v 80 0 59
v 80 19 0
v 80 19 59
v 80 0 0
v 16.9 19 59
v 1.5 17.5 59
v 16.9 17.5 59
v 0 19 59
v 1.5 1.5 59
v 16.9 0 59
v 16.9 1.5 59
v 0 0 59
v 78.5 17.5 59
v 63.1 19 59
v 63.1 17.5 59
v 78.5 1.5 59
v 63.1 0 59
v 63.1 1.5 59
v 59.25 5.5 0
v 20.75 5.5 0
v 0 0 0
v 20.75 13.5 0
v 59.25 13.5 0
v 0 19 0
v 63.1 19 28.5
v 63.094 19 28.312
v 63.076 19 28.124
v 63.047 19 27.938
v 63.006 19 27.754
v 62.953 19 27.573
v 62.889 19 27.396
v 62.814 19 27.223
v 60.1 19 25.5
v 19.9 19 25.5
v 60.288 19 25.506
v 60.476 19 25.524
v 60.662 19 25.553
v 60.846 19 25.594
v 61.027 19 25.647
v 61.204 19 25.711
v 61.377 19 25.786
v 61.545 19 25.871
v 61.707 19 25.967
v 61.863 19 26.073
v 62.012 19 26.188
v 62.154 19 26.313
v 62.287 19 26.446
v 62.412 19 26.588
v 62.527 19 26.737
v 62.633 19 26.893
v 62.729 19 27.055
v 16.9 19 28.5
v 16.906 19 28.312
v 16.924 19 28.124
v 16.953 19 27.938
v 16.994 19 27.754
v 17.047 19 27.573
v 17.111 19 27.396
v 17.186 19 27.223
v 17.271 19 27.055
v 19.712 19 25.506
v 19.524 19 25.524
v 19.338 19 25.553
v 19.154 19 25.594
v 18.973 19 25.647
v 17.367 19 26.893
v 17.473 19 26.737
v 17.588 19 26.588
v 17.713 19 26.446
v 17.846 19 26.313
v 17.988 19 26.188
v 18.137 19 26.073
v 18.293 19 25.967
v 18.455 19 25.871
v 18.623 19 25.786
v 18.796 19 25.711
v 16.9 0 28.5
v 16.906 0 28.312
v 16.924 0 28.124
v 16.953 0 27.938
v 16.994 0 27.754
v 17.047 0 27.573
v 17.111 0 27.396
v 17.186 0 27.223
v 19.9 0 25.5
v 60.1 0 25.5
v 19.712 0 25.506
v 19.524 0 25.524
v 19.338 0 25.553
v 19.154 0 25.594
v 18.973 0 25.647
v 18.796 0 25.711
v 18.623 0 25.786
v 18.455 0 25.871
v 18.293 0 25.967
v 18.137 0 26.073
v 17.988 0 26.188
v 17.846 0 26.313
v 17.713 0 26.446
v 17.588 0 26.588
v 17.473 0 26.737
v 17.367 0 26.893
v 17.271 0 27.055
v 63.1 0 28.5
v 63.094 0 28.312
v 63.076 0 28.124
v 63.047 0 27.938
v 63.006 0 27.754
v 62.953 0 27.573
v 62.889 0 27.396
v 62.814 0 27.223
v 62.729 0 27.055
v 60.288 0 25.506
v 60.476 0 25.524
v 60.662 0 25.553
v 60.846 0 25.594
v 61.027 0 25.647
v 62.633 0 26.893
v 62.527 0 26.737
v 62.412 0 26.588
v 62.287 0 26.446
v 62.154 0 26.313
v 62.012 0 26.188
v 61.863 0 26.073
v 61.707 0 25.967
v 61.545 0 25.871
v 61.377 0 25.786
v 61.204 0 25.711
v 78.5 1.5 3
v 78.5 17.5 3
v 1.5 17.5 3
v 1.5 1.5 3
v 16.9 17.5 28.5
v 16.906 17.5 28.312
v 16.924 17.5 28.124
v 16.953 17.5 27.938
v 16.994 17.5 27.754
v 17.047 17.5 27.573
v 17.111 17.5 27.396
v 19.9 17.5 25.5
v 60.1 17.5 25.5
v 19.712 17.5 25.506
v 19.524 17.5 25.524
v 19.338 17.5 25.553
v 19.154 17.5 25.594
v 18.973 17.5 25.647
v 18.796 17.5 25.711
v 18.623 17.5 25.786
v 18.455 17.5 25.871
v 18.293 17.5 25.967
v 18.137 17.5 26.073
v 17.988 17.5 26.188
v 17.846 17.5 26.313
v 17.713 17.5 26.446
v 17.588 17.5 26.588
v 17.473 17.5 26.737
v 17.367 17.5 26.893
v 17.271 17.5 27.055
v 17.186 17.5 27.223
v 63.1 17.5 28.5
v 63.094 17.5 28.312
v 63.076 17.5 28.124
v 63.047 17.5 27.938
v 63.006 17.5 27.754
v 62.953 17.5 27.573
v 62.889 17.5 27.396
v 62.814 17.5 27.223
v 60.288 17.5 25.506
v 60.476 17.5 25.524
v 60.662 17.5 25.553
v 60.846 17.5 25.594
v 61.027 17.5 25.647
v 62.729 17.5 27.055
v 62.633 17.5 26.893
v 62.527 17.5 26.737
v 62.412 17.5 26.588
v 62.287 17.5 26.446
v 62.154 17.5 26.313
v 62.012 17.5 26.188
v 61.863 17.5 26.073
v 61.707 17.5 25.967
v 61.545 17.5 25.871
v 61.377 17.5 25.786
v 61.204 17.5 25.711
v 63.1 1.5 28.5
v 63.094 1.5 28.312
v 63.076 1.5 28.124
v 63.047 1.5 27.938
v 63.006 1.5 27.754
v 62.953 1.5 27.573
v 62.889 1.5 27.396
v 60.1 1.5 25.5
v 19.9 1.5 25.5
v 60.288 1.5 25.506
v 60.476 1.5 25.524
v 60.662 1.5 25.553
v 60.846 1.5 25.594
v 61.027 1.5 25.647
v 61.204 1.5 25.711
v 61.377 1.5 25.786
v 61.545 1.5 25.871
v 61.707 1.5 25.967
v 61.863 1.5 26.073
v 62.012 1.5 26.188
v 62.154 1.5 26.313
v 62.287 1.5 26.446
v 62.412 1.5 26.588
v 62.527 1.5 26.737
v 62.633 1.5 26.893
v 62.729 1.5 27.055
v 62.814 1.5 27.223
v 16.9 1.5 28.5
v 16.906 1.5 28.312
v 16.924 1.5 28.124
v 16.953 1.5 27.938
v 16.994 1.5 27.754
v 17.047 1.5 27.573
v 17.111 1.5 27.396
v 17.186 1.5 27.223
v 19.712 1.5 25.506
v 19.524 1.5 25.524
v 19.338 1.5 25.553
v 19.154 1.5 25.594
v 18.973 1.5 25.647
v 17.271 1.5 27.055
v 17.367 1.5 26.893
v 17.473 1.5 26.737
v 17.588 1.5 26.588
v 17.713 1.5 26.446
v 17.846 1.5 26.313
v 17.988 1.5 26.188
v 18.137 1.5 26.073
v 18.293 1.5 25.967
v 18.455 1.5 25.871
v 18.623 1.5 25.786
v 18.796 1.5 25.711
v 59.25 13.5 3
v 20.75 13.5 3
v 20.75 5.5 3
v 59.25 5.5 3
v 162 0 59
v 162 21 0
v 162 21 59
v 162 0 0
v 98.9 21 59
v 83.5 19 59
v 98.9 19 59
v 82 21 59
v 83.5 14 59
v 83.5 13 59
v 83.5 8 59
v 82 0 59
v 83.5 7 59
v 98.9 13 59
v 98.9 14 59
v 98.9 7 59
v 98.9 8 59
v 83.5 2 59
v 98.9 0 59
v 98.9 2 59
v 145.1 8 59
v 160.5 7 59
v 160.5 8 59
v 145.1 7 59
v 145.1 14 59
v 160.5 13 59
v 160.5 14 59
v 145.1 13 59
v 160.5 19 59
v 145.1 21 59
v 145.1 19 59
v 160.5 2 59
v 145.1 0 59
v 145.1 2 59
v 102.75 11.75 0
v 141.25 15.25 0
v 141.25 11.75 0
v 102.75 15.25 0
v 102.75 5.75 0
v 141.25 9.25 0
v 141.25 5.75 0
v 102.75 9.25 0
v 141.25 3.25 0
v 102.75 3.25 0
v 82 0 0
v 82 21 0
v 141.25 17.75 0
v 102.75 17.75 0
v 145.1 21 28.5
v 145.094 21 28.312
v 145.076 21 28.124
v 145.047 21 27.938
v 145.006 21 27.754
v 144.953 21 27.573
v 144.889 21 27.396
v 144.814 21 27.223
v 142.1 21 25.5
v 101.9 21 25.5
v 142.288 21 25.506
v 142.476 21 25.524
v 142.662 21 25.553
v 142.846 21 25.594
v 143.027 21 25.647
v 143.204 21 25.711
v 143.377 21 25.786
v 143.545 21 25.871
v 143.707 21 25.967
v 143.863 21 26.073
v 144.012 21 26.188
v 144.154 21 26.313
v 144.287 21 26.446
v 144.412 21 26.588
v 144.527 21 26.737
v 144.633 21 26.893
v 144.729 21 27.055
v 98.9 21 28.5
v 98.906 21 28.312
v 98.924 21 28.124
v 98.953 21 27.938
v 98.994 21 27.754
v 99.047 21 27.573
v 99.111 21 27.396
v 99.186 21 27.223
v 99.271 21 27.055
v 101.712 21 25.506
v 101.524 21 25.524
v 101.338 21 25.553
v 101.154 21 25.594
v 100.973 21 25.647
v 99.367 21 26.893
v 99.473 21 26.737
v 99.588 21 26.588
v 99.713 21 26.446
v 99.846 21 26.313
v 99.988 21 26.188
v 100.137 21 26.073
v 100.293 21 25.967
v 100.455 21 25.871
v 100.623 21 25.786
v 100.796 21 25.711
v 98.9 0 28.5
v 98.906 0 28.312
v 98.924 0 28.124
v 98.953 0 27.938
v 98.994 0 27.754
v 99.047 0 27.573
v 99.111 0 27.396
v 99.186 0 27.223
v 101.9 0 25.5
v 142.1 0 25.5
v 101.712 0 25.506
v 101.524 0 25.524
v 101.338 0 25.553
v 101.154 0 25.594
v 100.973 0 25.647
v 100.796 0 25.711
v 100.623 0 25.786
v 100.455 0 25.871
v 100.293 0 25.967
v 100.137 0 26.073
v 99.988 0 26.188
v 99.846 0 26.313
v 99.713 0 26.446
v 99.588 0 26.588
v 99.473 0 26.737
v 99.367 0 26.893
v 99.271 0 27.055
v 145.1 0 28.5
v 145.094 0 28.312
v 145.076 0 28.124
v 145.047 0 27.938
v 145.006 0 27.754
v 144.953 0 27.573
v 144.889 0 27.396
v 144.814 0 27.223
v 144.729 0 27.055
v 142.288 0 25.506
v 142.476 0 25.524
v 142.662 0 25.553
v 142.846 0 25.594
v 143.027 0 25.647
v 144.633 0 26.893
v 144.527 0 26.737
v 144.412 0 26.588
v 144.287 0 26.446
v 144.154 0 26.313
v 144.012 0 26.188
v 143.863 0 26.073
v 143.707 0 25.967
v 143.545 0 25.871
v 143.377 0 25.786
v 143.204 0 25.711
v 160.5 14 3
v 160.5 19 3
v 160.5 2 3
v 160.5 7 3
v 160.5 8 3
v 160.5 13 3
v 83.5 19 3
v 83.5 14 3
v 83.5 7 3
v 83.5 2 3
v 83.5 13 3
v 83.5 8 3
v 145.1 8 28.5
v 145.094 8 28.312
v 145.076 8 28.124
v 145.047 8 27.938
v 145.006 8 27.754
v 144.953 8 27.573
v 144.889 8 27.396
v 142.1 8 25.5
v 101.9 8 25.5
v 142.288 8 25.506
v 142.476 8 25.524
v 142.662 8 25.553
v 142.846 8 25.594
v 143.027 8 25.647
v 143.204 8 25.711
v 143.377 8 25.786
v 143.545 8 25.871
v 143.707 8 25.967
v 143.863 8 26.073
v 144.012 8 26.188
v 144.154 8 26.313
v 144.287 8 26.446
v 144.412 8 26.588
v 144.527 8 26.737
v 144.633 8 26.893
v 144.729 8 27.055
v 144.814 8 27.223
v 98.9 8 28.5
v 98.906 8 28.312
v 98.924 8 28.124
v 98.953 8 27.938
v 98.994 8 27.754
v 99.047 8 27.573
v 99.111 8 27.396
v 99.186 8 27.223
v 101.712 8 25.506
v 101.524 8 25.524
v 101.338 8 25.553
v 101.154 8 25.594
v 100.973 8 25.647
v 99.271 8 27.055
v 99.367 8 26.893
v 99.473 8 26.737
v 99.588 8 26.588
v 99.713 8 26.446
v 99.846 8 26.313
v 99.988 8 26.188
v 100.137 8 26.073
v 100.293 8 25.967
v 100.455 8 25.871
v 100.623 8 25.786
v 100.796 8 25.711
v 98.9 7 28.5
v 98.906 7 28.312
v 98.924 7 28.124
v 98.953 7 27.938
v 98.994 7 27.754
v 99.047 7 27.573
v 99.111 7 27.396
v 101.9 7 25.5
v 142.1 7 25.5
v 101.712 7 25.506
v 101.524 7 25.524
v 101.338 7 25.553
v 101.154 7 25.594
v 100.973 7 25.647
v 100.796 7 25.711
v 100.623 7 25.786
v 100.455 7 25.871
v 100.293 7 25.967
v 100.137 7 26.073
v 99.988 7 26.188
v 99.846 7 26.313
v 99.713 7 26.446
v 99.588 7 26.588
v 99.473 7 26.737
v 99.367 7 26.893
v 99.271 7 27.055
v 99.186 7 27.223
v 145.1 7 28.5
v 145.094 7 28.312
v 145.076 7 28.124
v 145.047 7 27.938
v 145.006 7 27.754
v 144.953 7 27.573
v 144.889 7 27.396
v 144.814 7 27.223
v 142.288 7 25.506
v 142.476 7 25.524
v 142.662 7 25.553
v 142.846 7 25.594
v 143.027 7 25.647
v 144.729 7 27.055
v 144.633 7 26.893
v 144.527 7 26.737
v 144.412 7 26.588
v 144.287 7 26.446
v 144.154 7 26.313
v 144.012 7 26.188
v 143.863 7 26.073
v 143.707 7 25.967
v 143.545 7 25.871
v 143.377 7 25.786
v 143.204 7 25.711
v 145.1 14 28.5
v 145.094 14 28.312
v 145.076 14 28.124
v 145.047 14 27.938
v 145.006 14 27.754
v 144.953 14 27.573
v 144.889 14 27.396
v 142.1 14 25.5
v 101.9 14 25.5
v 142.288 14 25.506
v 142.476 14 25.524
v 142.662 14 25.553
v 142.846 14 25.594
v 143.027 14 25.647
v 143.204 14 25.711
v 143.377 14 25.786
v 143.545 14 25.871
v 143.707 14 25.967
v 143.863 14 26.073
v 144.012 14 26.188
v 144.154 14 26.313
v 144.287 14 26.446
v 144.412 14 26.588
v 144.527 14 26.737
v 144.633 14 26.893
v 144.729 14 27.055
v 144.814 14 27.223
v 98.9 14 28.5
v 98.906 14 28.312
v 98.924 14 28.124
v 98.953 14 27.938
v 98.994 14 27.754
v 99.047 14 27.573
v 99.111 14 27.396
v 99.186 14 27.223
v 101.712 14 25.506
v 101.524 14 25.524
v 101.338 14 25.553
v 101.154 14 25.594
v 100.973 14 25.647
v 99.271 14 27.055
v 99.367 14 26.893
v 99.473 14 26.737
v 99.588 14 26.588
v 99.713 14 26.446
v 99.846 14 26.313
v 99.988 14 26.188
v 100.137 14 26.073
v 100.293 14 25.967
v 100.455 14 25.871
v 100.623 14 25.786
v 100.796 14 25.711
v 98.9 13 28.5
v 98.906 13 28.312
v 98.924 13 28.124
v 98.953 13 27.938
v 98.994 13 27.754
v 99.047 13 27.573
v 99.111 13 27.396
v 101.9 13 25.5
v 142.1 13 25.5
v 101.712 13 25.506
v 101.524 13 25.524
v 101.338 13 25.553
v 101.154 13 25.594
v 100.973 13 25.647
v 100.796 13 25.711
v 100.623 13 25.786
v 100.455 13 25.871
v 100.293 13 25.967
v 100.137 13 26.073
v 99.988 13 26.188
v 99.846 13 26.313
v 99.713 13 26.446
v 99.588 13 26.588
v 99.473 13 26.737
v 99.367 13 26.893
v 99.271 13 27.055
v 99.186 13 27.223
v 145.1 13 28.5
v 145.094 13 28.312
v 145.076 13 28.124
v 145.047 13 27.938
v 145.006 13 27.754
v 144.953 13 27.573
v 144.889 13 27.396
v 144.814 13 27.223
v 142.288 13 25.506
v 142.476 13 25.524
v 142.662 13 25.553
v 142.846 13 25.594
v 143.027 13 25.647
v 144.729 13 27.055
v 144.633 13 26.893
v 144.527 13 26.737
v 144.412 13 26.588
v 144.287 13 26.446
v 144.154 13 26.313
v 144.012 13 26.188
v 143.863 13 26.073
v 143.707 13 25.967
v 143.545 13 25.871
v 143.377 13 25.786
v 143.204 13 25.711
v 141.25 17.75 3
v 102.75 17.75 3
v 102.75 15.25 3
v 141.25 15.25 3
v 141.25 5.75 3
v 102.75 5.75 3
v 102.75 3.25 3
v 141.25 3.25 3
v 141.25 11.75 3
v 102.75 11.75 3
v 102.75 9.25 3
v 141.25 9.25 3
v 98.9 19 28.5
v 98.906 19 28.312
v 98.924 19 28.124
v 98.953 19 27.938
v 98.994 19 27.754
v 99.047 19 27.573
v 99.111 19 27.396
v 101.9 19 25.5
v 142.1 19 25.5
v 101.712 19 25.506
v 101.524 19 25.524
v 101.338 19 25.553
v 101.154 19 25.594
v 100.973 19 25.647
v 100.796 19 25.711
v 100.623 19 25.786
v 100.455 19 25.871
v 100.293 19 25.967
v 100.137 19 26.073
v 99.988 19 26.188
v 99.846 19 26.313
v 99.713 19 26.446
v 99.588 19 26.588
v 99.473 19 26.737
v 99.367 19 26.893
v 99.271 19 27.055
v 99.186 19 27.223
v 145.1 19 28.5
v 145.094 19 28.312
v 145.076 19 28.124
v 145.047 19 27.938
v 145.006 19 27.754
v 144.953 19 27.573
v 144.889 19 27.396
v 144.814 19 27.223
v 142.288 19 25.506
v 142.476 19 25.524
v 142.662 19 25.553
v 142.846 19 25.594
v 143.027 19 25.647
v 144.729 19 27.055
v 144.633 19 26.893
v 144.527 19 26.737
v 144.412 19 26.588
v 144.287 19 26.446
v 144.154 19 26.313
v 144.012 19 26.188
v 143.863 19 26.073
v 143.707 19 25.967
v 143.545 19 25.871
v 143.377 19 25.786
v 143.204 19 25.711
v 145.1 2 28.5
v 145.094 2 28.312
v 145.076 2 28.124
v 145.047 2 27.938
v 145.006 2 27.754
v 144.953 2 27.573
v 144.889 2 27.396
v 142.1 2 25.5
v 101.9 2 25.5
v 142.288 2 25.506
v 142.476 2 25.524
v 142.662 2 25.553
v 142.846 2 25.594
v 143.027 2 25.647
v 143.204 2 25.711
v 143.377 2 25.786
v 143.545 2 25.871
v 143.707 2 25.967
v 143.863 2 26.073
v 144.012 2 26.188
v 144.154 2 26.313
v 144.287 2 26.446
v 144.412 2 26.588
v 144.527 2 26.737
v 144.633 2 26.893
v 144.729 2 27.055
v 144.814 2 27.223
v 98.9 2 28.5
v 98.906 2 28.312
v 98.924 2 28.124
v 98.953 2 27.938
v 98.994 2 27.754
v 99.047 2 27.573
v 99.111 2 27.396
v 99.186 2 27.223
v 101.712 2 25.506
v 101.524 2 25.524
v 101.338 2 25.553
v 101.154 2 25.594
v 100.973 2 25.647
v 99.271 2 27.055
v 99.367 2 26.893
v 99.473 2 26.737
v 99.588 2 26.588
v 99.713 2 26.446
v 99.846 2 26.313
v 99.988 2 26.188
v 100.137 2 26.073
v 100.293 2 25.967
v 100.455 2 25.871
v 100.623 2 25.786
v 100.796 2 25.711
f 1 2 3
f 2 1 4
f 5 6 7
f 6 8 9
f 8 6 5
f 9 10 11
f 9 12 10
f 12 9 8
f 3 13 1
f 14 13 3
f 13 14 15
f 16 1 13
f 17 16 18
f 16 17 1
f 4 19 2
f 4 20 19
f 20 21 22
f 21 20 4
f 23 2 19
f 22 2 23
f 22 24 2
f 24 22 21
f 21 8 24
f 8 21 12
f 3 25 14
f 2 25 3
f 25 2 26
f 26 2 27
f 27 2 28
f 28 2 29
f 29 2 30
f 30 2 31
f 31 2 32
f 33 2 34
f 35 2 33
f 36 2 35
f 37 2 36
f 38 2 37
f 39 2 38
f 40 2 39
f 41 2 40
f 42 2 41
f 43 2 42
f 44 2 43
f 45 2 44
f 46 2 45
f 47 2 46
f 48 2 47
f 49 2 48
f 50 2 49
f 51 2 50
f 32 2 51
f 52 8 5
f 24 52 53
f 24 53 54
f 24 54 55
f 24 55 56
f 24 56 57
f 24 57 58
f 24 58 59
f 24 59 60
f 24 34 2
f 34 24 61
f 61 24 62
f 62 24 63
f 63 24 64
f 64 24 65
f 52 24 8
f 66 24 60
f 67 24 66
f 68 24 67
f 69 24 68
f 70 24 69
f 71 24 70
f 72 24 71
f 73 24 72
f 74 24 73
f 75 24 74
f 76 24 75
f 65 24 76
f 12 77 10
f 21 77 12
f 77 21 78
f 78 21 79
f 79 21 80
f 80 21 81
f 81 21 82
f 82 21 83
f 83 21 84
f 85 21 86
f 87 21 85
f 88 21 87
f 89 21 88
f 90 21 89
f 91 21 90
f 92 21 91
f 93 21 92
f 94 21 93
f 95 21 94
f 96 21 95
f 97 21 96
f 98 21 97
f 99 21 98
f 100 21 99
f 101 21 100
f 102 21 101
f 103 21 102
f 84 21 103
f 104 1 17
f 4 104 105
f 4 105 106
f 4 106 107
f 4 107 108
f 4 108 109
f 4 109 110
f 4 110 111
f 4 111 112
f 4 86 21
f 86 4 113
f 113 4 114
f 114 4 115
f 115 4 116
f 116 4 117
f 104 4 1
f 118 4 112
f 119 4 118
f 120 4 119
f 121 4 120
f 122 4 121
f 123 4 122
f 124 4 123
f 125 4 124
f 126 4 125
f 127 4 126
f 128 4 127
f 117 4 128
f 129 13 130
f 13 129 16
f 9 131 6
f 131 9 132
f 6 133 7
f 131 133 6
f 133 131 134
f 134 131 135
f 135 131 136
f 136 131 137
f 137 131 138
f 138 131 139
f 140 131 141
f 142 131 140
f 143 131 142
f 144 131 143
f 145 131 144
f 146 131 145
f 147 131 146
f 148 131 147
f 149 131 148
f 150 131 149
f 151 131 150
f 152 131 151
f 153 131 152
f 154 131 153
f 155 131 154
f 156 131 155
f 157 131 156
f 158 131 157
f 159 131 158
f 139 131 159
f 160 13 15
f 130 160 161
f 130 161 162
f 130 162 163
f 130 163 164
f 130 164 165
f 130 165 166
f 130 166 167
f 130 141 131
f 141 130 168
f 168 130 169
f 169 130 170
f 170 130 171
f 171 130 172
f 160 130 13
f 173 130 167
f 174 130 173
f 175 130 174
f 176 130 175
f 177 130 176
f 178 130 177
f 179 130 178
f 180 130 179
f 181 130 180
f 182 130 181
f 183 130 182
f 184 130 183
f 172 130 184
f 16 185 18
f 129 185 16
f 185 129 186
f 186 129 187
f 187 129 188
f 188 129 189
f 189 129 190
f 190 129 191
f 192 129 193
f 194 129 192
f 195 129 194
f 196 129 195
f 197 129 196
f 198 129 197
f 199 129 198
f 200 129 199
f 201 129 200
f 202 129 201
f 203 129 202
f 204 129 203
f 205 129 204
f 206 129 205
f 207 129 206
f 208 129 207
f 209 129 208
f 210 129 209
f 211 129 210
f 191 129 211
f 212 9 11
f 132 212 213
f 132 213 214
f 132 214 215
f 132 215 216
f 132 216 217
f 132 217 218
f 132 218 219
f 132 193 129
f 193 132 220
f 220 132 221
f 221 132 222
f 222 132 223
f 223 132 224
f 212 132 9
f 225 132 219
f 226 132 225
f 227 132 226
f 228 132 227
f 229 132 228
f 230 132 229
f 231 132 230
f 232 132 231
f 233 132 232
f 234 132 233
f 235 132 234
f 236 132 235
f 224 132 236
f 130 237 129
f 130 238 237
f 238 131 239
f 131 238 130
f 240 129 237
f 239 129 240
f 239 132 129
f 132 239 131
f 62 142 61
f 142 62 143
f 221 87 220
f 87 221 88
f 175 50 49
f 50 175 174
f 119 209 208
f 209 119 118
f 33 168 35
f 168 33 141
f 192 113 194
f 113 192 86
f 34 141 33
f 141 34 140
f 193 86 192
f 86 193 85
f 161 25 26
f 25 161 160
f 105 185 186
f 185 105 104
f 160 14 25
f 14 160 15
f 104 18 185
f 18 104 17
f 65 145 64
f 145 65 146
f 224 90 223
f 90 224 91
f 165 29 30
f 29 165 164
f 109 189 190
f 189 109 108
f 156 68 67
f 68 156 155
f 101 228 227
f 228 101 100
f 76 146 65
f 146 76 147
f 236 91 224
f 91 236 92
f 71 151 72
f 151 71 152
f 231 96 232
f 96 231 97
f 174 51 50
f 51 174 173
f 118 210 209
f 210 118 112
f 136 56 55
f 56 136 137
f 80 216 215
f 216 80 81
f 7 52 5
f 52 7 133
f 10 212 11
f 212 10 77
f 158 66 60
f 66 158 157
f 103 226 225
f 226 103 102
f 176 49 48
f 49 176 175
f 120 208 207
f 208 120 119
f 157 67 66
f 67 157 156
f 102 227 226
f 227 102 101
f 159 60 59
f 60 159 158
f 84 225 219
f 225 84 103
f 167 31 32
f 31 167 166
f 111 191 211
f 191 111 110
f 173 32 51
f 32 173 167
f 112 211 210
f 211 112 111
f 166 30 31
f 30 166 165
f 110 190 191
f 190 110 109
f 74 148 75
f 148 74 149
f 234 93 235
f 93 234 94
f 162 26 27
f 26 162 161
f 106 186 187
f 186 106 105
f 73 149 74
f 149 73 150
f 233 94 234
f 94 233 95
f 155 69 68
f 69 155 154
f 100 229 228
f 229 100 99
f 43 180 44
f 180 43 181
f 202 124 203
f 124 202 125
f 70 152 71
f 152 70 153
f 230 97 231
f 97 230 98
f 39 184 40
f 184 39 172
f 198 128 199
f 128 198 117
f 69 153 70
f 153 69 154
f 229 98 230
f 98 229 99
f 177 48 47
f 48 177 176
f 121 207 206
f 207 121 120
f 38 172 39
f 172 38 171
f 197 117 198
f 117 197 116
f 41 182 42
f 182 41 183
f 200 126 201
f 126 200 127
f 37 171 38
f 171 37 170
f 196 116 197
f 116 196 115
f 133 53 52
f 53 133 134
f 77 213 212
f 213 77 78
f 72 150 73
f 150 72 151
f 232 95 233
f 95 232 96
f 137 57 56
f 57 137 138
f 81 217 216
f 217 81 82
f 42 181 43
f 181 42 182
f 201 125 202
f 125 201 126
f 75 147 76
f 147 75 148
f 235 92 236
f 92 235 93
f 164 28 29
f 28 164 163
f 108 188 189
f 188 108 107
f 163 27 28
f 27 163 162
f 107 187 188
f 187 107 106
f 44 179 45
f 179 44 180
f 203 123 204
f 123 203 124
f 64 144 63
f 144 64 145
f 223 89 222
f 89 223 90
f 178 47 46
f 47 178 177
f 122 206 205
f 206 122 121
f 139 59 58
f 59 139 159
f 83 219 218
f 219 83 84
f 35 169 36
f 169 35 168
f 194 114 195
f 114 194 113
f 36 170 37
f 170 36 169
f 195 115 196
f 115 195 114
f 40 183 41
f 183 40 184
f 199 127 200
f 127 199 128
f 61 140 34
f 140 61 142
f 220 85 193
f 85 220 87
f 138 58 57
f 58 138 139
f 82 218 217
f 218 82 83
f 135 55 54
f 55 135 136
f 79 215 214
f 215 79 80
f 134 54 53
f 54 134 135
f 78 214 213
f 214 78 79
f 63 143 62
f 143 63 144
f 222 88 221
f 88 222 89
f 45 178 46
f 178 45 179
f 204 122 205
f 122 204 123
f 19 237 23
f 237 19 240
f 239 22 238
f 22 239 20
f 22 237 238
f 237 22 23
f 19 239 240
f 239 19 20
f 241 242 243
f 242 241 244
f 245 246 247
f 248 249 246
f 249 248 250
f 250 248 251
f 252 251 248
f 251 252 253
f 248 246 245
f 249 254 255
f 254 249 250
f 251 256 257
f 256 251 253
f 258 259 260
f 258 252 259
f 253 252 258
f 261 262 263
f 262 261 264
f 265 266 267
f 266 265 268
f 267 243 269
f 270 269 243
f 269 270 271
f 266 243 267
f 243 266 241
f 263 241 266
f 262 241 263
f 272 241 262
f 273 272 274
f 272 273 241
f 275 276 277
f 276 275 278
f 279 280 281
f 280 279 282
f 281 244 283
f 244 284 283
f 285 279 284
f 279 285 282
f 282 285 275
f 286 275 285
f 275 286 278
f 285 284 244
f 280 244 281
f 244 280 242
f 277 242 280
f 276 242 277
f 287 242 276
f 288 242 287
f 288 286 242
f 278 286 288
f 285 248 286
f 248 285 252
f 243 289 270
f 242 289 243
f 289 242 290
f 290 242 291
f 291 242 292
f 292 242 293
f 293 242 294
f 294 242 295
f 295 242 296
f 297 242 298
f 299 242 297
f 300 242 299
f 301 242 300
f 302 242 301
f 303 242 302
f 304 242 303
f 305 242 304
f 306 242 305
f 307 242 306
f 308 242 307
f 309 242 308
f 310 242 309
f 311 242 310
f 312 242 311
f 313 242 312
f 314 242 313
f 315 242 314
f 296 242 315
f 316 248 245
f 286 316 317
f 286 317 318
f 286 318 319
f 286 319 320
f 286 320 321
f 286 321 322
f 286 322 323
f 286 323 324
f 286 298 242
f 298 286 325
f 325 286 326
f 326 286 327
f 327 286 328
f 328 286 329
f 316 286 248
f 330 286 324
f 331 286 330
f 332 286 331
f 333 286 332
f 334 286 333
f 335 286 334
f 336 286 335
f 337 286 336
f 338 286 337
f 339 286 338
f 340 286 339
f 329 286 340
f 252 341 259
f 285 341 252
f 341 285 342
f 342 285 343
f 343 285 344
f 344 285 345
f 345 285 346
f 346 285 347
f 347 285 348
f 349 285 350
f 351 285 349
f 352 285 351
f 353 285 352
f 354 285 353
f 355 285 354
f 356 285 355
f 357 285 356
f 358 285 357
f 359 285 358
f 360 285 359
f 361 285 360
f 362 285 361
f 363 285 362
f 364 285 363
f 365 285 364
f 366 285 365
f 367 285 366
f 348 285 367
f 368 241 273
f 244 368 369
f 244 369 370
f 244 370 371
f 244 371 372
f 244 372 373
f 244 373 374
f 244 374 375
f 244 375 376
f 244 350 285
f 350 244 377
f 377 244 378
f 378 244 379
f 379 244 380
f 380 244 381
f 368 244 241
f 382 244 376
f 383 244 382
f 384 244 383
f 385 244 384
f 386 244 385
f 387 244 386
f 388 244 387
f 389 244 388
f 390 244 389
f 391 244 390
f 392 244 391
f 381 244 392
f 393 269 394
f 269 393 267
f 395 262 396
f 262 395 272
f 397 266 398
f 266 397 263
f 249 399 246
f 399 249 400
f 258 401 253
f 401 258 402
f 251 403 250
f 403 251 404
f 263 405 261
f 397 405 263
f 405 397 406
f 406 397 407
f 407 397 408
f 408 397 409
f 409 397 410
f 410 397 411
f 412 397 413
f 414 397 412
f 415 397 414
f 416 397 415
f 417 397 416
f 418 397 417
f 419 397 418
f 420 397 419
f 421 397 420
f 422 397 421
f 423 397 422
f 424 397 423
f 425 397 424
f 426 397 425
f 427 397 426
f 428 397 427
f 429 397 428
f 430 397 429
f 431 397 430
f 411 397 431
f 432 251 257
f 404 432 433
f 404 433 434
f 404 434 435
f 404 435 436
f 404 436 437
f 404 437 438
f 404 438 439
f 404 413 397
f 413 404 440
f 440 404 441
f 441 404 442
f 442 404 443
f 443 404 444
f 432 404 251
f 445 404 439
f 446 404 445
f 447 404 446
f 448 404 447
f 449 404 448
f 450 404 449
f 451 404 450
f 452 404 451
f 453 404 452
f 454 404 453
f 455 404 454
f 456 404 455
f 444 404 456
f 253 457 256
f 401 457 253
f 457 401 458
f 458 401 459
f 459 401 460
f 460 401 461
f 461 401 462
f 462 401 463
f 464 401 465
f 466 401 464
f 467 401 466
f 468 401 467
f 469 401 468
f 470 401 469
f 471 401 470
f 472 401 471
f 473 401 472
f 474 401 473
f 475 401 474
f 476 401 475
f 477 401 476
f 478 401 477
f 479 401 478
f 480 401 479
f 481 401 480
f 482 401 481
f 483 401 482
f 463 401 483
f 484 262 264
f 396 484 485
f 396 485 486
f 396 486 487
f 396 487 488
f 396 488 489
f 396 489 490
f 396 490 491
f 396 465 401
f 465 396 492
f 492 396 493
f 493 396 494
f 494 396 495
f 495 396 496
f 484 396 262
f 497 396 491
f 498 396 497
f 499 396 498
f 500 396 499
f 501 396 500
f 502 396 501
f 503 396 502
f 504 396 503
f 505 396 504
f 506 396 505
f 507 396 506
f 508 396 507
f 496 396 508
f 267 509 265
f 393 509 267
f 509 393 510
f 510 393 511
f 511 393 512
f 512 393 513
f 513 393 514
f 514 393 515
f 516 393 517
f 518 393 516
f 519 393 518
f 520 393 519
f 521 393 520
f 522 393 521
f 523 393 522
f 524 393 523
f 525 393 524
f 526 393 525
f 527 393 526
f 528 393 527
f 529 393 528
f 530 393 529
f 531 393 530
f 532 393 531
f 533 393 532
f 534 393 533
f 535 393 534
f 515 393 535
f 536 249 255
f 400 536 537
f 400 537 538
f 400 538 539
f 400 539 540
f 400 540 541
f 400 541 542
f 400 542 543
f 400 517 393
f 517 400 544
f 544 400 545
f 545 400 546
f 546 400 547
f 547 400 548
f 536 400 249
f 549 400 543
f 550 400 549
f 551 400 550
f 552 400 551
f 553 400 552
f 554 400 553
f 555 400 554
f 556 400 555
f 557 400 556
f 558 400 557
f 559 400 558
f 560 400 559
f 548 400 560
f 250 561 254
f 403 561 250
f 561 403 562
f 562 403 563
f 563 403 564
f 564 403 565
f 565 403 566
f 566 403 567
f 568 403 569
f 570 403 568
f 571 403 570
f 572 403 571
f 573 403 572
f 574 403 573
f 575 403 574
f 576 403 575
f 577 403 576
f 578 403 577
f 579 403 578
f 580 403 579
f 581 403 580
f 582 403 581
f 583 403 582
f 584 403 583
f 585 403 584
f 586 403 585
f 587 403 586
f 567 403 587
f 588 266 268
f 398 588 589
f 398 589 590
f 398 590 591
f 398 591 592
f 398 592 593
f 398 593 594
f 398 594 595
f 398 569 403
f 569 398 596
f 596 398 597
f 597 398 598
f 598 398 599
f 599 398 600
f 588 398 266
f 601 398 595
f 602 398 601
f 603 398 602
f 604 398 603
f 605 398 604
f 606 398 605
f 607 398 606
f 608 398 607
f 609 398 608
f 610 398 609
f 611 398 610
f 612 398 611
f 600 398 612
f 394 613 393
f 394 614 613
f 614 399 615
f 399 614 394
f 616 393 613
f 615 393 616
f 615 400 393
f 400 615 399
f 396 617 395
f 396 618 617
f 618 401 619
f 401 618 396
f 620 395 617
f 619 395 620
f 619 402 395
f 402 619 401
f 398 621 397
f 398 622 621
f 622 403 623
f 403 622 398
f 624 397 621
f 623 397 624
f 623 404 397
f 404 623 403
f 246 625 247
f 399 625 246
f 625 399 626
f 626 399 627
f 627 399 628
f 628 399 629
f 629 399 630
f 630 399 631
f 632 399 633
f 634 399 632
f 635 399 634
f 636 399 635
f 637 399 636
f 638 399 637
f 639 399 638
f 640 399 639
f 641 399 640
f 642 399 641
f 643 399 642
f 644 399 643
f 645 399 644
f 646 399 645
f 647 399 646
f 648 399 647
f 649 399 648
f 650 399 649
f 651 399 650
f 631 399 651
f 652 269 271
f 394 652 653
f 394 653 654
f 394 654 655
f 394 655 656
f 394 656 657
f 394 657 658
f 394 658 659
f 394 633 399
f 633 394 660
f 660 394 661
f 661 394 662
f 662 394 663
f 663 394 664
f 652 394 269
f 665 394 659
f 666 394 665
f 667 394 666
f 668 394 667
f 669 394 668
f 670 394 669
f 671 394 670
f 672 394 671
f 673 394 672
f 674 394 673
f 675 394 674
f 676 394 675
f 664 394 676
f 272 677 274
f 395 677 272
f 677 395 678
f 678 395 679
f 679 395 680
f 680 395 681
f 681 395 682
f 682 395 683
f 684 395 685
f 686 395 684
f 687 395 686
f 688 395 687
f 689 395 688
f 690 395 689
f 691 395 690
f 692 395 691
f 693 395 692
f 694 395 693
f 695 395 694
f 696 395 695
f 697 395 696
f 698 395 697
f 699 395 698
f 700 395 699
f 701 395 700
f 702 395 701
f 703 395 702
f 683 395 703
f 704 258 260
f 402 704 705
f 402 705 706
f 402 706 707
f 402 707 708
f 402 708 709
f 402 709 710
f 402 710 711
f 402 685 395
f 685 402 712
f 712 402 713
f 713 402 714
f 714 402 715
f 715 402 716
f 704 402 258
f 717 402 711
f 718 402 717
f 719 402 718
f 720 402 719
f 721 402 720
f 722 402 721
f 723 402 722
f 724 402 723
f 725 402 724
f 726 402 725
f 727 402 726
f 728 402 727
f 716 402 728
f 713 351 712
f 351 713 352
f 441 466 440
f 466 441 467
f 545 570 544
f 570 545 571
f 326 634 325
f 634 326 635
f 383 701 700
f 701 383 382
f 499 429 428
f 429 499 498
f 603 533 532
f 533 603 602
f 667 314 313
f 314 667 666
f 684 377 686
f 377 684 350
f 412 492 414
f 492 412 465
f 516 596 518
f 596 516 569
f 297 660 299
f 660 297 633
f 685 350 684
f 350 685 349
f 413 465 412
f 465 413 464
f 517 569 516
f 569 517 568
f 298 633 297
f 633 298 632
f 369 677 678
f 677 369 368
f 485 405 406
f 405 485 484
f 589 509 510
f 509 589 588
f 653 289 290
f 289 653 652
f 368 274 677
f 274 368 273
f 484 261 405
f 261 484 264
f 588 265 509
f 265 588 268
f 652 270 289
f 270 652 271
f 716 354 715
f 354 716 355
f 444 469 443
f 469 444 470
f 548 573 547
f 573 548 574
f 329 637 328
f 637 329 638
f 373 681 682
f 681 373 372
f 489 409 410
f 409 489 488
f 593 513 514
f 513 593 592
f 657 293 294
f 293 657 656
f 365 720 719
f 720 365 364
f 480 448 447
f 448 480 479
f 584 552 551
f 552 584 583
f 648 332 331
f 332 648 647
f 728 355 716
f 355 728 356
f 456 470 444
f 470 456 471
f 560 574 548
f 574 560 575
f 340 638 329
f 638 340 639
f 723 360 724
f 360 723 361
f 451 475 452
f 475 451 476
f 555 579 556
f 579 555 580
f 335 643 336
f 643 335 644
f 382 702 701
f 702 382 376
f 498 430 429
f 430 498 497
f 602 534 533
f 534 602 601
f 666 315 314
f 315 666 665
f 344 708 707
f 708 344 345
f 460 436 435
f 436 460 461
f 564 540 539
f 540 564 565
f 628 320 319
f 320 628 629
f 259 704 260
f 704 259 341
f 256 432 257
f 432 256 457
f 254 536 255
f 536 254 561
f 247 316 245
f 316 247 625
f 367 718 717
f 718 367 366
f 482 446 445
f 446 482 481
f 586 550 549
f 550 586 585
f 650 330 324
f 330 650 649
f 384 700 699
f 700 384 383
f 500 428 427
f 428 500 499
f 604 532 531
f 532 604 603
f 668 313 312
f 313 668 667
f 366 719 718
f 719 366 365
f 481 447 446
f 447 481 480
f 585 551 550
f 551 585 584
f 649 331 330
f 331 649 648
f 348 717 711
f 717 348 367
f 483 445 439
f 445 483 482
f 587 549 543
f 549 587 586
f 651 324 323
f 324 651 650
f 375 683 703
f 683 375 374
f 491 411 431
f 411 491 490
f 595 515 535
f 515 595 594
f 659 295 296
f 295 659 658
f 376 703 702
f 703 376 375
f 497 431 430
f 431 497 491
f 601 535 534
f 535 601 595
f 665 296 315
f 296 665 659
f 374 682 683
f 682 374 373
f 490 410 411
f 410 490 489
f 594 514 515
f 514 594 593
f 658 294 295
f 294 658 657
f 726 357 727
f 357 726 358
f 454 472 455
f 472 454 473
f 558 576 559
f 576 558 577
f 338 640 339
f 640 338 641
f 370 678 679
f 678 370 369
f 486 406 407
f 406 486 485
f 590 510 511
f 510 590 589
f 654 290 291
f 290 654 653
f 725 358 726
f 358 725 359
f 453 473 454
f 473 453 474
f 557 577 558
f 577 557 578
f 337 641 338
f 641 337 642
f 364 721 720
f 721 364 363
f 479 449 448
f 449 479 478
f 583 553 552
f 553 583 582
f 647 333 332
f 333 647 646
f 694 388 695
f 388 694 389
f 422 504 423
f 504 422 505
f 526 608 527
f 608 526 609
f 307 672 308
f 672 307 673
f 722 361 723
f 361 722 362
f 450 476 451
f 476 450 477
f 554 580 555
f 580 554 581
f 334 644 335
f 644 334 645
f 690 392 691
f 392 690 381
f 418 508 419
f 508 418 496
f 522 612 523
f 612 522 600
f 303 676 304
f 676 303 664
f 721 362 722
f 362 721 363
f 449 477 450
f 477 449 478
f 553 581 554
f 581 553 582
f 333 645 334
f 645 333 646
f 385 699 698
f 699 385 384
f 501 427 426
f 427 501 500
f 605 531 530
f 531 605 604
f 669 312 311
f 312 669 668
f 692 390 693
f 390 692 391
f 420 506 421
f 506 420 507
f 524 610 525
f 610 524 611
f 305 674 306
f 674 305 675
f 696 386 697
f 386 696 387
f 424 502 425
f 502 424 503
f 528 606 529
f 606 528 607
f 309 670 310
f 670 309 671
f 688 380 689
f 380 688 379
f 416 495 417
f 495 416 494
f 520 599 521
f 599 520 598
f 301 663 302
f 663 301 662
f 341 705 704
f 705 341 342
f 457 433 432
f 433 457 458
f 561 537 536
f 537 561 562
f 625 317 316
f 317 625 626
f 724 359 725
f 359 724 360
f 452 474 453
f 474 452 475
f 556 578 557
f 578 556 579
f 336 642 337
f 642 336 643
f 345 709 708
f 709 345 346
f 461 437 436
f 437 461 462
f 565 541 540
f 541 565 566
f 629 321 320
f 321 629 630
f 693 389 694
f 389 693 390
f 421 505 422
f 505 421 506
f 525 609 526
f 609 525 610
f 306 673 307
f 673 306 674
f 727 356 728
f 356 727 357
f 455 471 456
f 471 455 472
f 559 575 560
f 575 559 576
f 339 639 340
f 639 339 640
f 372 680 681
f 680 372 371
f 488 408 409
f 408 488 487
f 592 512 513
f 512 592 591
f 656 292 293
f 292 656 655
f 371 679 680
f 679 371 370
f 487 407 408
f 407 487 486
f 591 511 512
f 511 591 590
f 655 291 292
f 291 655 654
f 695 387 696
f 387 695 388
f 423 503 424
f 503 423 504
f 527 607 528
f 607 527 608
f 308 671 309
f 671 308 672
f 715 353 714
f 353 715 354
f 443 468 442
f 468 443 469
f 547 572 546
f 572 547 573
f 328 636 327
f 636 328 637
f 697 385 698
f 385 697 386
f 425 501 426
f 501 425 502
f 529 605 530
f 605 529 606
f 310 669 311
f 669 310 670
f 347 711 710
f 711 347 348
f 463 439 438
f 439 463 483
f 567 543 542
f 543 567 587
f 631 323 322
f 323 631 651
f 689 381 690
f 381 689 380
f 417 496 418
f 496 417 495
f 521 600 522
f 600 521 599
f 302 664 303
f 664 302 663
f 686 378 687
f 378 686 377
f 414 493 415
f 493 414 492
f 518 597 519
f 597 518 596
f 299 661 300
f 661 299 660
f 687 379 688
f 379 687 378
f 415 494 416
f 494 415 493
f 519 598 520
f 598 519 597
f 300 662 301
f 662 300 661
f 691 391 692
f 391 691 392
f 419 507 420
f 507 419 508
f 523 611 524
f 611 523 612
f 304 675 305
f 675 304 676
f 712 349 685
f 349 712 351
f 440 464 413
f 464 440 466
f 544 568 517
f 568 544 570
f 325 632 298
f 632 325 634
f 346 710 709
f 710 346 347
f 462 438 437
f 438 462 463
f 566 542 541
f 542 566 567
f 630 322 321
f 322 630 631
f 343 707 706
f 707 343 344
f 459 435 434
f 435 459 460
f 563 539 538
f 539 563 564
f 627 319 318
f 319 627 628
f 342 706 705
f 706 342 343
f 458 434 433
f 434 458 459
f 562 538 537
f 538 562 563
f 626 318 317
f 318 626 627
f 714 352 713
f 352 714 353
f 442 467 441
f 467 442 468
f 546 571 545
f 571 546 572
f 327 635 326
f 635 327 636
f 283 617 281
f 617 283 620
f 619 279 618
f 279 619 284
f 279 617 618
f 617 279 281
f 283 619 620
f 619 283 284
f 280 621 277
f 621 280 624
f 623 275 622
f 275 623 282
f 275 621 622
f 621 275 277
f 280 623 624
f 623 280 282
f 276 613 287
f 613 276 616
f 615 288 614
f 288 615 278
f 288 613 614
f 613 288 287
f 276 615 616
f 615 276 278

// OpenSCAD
include <../lib/boardgame_insert_toolkit_lib.2.scad>;

// determines whether lids are output.
g_b_print_lid = true;

// determines whether boxes are output.
g_b_print_box = true; 

// Focus on one box
g_isolated_print_box = ""; 

// Used to visualize how all of the boxes fit together. 
g_b_visualization = false;          
        
// this is the outer wall thickness. 
//Default = 1.5mm
g_wall_thickness = 1.5;

// The tolerance value is extra space put between planes of the lid and box that fit together.
// Increase the tolerance to loosen the fit and decrease it to tighten it.
//
// Note that the tolerance is applied exclusively to the lid.
// So if the lid is too tight or too loose, change this value ( up for looser fit, down for tighter fit ) and 
// you only need to reprint the lid.
// 
// The exception is the stackable box, where the bottom of the box is the lid of the box below,
// in which case the tolerance also affects that box bottom.
//
g_tolerance = 0.15;

// This adjusts the position of the lid detents downward. 
// The larger the value, the bigger the gap between the lid and the box.
g_tolerance_detents_pos = 0.1;

// This determines whether the default single material version is output, or, if printing in multiple materials, 
// which layer to output.
//
g_print_mmu_layer = "default"; // [ "default" | "mmu_box_layer" | "mmu_label_layer" ]

data =
[


    [   "card tray - alpha+beta",
        [
            [ BOX_SIZE_XYZ,[80.0, 19.0, 59.0] ],
            [ BOX_NO_LID_B,
                [
                    [ ],
                ]
            ],
            [ BOX_COMPONENT,
                [
                    [ CMP_SHAPE, SQUARE ],
                    [ CMP_COMPARTMENT_SIZE_XYZ, [ 77, 16, 56.0] ],
                    [ CMP_CUTOUT_SIDES_4B, [t,t,f,f]],
                    [ CMP_CUTOUT_HEIGHT_PCT, 50 ],
                    [ CMP_CUTOUT_WIDTH_PCT, 60 ],
                    [ CMP_CUTOUT_TYPE, BOTH ],
                    [ CMP_CUTOUT_BOTTOM_B, t ],
                    [ CMP_CUTOUT_BOTTOM_PCT, 50 ],
                ]
            ],

        ]
    ],
    [   "card tray - omega, events, solo",
        [
            [ BOX_SIZE_XYZ,[80.0, 21.0, 59.0] ],
            [ BOX_NO_LID_B,
                [
                    [ ],
                ]
            ],
            [ BOX_COMPONENT,
                [
                    [ CMP_SHAPE, SQUARE ],
                    [ CMP_NUM_COMPARTMENTS_XY, [1, 3] ],
                    [ CMP_COMPARTMENT_SIZE_XYZ, [ 77, 5, 56.0] ],
                    [ CMP_CUTOUT_SIDES_4B, [t,t,f,f]],
                    [ CMP_CUTOUT_HEIGHT_PCT, 50 ],
                    [ CMP_CUTOUT_WIDTH_PCT, 60 ],
                    [ CMP_CUTOUT_TYPE, BOTH ],
                    [ CMP_CUTOUT_BOTTOM_B, t ],
                    [ CMP_CUTOUT_BOTTOM_PCT, 50 ],
                ]
            ],

        ]
    ],
];


MakeAll();
